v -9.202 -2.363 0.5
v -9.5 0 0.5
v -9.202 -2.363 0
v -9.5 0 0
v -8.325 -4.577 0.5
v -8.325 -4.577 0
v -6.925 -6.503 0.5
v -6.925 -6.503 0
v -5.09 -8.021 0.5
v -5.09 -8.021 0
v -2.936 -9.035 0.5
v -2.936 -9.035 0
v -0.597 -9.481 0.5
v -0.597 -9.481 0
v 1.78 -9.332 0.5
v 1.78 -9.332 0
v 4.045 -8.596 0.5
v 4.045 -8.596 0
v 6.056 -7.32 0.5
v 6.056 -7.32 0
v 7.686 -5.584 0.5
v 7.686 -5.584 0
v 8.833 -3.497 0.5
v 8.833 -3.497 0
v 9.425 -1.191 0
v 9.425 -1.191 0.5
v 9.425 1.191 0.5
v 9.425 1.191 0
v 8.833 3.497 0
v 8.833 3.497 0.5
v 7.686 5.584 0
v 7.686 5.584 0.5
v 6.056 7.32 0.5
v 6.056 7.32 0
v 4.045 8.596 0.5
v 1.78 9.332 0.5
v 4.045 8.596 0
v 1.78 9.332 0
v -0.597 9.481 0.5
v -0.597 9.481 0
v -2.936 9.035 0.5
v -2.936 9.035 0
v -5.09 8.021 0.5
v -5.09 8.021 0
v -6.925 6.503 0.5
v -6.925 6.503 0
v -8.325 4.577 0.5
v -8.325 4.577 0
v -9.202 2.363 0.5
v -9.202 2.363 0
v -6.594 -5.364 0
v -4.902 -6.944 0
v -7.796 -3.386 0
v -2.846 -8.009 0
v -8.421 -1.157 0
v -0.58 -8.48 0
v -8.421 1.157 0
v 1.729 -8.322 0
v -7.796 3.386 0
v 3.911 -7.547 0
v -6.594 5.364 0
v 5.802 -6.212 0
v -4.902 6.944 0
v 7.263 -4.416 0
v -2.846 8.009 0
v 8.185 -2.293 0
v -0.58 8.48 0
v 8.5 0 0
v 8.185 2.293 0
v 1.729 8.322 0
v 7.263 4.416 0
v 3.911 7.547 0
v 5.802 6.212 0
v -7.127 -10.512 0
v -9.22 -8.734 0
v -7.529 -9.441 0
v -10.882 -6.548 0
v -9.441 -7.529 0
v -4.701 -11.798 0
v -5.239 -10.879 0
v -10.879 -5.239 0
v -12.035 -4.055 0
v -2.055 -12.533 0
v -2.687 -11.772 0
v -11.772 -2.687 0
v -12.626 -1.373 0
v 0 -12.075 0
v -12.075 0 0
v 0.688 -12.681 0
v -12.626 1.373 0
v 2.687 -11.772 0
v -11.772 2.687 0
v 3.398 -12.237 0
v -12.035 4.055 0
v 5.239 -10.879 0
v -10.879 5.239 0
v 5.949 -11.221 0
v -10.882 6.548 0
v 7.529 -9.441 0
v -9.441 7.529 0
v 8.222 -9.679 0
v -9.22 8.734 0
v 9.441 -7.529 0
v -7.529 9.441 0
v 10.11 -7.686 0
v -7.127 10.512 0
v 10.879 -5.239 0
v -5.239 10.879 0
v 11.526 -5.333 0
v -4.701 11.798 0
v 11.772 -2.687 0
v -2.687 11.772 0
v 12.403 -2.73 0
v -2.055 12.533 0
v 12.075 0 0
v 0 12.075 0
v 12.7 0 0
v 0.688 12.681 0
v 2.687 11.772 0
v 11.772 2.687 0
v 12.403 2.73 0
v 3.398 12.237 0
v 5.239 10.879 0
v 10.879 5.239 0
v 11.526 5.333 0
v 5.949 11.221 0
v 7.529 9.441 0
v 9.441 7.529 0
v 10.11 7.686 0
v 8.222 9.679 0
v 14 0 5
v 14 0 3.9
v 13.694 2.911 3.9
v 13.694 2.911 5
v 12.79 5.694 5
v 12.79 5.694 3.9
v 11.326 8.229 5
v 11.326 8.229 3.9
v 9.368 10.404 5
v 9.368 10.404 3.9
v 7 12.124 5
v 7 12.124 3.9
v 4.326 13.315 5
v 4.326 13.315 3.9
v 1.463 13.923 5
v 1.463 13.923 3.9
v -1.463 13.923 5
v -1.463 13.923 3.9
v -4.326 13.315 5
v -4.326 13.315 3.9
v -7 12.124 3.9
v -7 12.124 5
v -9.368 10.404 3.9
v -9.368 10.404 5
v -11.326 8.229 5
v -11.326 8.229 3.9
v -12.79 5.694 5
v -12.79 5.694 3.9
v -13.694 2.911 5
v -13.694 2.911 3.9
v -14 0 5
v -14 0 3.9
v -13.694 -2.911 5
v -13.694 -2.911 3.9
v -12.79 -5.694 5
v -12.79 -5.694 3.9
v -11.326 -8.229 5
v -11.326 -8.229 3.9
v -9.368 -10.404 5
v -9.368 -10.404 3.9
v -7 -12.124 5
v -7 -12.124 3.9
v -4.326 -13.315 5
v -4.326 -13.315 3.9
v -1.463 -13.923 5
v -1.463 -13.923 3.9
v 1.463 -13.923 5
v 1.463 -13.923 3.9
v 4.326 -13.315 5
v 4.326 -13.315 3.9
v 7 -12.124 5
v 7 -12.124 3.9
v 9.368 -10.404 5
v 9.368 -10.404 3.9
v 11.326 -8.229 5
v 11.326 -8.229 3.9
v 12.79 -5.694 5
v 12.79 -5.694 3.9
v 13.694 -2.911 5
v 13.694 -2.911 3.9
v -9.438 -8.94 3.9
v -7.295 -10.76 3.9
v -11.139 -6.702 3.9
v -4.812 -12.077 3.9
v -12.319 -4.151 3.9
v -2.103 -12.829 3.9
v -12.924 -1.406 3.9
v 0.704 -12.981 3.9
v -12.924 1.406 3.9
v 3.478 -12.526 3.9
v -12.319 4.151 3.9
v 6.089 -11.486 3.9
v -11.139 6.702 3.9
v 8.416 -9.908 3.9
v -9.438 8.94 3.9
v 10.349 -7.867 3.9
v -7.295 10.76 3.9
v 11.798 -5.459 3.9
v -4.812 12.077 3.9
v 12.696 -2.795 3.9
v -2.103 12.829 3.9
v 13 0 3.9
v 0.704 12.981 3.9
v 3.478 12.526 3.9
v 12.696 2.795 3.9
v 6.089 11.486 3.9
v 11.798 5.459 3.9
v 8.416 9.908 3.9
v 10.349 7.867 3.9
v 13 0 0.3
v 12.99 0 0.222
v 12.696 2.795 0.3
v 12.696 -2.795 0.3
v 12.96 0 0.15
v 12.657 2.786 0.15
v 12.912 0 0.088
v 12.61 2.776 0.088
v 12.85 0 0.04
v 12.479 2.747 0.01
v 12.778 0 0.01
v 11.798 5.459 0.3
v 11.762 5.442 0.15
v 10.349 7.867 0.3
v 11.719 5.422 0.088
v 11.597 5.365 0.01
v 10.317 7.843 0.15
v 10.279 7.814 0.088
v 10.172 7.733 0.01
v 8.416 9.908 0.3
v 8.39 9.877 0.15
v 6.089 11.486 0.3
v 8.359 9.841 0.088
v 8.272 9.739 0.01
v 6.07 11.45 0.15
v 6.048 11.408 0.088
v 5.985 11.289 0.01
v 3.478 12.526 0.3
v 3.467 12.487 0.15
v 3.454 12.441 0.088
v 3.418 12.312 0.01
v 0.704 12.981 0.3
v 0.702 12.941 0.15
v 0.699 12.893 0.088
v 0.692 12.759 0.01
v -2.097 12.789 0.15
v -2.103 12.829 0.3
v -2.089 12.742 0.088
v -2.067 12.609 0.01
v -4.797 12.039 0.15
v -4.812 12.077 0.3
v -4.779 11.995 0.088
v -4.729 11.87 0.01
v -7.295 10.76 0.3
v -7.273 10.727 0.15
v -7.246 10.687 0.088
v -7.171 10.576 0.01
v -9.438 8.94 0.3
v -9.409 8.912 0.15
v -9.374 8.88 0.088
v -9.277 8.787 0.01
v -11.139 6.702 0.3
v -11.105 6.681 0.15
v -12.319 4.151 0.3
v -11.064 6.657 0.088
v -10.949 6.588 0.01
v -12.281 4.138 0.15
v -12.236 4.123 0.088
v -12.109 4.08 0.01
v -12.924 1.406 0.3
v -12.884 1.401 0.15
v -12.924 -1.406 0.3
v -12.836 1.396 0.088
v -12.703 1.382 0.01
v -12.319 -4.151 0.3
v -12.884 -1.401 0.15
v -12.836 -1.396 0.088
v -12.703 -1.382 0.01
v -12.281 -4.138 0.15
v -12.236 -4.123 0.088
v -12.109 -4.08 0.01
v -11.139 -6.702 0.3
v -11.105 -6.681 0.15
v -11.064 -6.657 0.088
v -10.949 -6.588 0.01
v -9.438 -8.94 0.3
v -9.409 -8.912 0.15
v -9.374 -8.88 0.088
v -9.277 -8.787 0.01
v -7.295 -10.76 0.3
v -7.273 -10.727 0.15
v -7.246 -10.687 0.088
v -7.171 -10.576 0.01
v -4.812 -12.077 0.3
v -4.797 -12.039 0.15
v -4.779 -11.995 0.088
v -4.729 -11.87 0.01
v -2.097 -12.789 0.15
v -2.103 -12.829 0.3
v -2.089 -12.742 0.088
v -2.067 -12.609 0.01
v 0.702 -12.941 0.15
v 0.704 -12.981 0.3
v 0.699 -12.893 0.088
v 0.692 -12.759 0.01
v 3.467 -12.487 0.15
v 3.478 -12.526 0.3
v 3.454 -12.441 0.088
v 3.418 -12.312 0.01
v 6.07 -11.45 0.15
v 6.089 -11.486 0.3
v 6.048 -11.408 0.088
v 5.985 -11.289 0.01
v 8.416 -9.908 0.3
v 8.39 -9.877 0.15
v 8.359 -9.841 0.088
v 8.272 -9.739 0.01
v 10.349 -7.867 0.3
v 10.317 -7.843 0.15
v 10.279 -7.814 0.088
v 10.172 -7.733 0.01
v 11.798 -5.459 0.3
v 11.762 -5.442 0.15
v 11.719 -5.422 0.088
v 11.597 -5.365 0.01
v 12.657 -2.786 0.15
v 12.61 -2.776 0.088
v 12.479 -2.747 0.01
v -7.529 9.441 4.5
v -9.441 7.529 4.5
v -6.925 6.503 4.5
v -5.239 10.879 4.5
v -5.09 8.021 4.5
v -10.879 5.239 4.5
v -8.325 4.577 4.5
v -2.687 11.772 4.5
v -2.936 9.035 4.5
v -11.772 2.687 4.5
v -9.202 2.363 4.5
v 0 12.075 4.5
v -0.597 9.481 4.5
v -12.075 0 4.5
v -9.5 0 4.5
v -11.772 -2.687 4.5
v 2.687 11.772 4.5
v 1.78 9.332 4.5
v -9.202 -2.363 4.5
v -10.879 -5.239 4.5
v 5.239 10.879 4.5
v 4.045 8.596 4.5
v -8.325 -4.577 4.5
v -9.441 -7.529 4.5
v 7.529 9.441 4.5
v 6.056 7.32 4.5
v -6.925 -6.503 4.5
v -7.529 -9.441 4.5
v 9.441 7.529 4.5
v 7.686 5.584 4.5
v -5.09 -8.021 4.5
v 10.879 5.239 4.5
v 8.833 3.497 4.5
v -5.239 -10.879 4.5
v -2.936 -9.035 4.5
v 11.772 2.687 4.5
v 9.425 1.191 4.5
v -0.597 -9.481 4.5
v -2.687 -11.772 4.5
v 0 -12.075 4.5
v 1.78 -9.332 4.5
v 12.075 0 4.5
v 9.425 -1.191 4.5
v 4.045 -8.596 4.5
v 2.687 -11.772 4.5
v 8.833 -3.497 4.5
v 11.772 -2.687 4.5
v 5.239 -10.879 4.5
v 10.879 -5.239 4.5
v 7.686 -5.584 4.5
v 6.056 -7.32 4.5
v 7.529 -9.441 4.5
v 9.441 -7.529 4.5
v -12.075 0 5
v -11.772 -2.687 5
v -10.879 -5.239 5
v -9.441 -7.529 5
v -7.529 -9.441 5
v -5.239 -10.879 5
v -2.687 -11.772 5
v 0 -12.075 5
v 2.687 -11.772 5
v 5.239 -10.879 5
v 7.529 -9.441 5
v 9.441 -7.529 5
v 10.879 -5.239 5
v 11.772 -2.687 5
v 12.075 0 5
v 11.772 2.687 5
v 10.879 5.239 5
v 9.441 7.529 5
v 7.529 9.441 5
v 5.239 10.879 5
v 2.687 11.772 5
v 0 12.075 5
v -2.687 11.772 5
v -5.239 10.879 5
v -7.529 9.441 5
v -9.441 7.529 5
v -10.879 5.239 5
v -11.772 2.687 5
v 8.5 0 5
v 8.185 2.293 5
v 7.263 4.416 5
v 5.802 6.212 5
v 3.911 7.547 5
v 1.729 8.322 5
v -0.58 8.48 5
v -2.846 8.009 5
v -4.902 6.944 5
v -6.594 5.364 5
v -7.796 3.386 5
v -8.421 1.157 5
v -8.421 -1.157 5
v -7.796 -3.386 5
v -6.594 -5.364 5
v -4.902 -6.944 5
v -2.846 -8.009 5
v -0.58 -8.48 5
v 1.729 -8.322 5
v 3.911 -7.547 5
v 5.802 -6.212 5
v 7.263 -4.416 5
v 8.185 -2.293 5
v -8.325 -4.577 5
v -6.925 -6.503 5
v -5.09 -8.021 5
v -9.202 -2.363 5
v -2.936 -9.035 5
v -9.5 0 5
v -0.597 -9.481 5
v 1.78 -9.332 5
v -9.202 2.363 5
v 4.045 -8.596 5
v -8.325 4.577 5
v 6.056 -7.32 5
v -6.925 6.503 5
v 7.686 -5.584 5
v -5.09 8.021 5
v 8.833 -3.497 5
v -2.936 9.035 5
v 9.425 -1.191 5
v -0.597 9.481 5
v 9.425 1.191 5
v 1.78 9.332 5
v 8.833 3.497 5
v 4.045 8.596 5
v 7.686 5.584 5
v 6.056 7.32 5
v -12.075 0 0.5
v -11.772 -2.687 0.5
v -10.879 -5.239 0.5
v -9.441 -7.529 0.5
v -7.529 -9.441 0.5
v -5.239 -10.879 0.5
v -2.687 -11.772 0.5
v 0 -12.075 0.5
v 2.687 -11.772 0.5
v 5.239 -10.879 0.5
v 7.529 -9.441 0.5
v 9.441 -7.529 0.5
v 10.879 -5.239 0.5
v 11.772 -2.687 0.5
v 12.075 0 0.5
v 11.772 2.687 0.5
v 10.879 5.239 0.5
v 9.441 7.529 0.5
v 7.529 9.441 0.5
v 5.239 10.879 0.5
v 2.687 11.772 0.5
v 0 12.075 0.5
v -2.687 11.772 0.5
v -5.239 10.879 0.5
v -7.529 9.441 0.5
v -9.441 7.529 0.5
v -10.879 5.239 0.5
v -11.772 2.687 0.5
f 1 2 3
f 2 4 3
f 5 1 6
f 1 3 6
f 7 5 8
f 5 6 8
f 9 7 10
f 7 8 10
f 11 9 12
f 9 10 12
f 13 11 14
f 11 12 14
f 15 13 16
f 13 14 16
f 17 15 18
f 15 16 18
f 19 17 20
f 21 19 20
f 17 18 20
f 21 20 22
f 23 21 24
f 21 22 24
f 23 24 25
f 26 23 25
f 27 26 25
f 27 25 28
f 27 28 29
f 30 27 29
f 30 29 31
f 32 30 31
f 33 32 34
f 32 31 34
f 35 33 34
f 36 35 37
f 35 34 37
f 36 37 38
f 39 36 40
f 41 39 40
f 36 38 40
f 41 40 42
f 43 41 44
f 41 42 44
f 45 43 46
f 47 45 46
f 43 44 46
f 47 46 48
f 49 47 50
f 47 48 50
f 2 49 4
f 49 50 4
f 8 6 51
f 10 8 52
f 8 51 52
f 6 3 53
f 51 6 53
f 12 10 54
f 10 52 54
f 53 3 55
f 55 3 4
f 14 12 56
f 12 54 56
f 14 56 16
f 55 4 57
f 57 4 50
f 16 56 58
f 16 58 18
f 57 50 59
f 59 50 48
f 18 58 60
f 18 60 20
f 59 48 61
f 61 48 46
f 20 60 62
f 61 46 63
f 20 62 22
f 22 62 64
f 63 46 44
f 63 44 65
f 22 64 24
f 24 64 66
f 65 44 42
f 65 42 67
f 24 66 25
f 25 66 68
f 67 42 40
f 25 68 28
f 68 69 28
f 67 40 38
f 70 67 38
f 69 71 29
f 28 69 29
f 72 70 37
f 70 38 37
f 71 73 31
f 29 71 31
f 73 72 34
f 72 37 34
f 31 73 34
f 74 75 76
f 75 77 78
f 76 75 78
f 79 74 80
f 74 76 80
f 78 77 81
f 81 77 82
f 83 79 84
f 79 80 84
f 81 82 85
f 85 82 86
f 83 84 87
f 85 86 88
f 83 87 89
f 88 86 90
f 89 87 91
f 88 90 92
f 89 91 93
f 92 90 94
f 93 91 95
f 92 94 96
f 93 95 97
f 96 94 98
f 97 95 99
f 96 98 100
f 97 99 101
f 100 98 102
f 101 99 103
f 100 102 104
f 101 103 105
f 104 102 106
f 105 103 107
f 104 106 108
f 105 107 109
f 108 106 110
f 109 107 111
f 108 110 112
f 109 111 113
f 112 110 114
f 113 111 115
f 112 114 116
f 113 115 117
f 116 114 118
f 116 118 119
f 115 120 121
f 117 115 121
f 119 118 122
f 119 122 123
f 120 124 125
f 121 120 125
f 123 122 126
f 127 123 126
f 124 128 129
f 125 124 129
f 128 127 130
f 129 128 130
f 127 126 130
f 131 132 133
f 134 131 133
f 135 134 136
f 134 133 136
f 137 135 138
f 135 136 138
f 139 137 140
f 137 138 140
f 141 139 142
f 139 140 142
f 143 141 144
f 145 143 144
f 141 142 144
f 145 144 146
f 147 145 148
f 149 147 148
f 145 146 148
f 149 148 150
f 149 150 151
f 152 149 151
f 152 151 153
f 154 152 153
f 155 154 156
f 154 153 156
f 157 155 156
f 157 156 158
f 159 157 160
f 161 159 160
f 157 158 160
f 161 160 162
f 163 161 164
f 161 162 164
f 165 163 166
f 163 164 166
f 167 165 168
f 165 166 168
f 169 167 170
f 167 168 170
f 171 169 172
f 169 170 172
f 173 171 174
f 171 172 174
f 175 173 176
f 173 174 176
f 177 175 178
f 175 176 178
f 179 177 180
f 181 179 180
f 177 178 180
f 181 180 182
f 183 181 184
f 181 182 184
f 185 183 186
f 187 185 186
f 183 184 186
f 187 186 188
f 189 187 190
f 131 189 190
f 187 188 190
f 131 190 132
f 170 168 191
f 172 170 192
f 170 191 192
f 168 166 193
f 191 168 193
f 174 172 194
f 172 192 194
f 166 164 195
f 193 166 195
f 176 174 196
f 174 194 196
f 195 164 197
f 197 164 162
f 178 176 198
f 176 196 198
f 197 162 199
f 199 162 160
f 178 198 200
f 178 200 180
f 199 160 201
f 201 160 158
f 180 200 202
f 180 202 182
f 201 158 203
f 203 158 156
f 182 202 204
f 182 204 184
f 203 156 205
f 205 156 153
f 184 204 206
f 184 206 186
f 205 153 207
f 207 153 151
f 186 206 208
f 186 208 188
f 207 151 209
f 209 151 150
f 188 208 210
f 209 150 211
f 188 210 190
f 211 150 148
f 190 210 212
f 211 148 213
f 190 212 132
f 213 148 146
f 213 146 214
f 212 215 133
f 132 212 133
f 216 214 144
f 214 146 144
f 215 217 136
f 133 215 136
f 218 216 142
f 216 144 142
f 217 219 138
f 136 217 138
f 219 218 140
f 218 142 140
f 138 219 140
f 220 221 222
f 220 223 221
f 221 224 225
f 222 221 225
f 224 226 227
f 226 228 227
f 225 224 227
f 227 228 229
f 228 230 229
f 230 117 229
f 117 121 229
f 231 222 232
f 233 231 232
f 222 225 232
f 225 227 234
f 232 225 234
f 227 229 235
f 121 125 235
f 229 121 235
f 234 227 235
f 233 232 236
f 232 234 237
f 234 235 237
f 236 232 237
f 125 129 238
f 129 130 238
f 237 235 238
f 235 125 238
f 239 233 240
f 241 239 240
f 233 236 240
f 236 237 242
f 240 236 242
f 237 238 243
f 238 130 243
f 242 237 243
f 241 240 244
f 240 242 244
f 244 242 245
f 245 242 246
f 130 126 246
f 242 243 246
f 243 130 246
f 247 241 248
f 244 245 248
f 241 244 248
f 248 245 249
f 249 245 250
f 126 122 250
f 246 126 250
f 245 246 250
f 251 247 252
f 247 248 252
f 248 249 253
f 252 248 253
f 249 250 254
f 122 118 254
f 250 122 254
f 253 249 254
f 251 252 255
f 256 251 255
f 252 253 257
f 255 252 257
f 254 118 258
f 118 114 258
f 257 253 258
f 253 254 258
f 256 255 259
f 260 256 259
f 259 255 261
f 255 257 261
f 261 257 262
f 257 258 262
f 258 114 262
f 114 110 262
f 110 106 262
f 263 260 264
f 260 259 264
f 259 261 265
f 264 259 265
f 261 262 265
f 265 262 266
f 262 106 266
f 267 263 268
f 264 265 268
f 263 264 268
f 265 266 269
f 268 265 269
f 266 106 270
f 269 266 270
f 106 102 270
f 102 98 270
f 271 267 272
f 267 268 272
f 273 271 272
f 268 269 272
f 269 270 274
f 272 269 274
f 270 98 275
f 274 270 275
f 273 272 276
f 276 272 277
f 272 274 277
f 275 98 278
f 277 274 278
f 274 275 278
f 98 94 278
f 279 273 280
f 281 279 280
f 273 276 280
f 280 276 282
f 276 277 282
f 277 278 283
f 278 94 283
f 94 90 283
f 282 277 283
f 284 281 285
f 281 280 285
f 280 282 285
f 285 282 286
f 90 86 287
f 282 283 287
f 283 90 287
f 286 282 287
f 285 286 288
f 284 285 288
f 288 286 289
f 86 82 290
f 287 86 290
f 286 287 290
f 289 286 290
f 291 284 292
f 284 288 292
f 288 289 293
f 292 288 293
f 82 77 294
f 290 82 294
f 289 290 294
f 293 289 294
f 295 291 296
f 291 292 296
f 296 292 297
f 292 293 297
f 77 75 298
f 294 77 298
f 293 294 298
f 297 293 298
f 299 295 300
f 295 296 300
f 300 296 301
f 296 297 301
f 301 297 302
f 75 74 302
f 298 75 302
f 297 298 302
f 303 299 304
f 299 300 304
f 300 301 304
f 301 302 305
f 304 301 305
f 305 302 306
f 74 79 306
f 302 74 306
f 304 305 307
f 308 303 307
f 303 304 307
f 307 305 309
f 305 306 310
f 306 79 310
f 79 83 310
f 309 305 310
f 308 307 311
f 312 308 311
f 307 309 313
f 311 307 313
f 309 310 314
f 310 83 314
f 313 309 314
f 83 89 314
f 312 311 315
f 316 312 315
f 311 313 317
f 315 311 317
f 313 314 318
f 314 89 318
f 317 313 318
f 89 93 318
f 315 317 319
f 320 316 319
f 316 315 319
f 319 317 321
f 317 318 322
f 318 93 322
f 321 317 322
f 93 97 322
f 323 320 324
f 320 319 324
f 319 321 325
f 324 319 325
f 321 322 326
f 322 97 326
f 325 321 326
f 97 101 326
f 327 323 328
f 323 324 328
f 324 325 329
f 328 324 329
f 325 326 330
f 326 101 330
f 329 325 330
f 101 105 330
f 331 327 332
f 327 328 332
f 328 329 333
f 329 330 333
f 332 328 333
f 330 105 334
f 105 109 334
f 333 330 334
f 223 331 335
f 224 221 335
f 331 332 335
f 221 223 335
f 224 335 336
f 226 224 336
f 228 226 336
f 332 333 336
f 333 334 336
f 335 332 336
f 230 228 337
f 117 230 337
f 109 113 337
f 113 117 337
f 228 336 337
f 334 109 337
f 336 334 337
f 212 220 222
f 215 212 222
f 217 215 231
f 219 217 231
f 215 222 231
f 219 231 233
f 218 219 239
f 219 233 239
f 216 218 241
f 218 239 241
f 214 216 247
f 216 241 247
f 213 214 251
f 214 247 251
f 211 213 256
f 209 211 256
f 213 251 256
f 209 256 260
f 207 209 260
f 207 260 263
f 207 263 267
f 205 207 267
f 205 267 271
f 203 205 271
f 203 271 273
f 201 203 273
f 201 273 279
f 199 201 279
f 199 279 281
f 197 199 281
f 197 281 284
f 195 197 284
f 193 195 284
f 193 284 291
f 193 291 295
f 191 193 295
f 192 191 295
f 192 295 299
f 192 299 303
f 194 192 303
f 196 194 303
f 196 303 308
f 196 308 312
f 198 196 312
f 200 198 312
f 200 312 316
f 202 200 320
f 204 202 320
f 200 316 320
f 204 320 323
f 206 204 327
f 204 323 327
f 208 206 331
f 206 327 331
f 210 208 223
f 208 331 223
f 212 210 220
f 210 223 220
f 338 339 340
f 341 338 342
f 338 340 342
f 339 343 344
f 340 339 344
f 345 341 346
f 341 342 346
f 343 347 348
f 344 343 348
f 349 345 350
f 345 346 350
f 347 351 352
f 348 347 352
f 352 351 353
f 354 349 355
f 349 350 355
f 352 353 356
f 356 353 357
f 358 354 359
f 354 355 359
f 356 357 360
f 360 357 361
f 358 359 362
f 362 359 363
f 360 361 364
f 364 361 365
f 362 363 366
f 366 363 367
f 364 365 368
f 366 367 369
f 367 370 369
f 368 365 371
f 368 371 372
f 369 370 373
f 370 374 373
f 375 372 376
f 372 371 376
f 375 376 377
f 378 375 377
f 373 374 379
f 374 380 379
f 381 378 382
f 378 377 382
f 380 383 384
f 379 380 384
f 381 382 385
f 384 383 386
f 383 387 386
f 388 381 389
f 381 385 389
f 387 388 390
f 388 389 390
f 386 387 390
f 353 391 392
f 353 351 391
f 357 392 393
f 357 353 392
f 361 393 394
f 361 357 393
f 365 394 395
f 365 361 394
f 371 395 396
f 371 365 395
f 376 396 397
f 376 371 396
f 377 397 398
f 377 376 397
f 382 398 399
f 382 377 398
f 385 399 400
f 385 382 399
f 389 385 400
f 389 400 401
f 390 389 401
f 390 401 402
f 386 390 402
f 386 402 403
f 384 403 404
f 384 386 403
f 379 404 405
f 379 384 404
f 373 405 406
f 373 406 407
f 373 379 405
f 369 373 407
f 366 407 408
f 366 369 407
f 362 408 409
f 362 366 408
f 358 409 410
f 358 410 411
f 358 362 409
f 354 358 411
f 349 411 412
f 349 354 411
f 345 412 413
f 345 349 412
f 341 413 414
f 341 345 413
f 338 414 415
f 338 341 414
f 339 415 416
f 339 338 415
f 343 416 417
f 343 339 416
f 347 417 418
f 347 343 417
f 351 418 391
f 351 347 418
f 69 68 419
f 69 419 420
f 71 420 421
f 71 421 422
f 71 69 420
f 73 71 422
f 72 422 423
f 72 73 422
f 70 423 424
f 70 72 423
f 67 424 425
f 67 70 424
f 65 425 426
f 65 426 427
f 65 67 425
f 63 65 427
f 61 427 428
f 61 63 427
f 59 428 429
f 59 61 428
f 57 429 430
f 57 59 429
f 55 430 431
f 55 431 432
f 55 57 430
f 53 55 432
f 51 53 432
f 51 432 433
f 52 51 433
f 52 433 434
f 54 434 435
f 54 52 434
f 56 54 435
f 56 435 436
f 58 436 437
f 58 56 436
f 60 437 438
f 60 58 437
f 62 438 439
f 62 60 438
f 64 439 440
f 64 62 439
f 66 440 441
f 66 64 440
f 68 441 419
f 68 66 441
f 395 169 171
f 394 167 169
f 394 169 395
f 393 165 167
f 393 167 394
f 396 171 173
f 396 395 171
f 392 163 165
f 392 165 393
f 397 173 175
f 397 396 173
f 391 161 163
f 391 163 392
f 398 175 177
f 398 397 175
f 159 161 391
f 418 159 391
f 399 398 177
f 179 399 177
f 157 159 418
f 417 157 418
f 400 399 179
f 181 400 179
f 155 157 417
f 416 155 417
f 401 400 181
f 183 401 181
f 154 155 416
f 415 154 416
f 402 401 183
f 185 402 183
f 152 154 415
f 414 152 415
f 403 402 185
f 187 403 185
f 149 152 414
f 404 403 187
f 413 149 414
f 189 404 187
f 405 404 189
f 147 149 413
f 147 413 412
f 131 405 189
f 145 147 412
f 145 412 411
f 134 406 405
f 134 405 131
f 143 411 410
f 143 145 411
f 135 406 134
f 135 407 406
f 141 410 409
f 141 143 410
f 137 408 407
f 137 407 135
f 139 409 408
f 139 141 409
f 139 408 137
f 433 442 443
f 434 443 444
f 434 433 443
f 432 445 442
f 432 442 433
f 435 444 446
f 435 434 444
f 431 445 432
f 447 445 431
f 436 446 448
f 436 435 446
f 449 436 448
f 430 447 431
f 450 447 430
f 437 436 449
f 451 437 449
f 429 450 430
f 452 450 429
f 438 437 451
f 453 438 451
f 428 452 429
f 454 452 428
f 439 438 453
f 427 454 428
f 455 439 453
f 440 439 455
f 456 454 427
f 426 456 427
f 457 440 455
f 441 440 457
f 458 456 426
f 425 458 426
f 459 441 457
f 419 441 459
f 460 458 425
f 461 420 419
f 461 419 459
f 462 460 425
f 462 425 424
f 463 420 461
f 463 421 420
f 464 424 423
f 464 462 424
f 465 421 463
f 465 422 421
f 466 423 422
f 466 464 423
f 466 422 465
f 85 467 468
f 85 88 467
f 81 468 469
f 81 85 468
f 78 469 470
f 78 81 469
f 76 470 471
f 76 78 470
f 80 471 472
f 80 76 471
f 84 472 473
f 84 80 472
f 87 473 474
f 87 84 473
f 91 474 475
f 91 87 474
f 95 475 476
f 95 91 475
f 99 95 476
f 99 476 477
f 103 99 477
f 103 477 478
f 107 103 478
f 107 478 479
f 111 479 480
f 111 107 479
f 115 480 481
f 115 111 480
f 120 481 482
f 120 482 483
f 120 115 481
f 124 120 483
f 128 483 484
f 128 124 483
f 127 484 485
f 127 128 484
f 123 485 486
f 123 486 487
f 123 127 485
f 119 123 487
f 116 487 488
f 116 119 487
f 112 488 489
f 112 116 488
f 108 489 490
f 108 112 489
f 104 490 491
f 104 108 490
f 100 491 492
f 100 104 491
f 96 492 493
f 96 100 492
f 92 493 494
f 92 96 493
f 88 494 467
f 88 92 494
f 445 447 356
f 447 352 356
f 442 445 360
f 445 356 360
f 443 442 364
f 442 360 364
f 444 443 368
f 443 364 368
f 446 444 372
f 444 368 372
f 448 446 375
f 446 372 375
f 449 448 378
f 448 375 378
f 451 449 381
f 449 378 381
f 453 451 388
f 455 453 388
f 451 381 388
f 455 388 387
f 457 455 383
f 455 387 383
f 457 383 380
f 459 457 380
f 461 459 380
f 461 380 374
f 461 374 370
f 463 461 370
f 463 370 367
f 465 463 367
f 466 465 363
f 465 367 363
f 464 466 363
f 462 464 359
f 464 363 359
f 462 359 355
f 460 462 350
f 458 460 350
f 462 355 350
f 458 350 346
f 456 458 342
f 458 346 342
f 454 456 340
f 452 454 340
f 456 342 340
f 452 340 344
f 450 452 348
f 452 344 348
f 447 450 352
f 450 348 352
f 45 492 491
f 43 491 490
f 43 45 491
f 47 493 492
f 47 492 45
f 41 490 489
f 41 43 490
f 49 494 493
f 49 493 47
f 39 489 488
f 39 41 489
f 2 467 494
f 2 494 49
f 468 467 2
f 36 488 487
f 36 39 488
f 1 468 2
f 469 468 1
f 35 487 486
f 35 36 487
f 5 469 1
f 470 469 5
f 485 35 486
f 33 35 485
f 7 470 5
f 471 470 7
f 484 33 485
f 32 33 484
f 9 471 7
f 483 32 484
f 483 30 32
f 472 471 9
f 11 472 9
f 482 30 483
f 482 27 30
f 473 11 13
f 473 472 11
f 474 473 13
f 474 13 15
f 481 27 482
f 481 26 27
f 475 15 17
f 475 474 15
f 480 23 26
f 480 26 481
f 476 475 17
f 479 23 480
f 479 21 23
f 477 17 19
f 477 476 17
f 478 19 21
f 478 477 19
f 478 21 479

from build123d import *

# Parameters (mm, degrees)
SKETCH_1_R      = 13
SKETCH_1_R_2    = 8.5
EXTRUDE_1_DEPTH = 5
EXTRUDE_START   = -1.1
SKETCH_2_R      = 14
SKETCH_2_R_2    = 13
EXTRUDE_2_DEPTH = 1.1
FILLET_1_R      = 0.3
SKETCH_3_W      = 0.5
SKETCH_3_H      = 2.575


with BuildPart() as part:
    # 草图1 → 凸台-拉伸1 (new body)
    with BuildSketch(Plane.XY):
        Circle(SKETCH_1_R)
        Circle(SKETCH_1_R_2, mode=Mode.SUBTRACT)
    extrude(amount=EXTRUDE_1_DEPTH)

    # 草图2 → 凸台-拉伸2 (add)
    with BuildSketch(Plane.XY.offset(5).offset(EXTRUDE_START)):
        Circle(SKETCH_2_R)
        Circle(SKETCH_2_R_2, mode=Mode.SUBTRACT)
    extrude(amount=EXTRUDE_2_DEPTH)

    # 圆角1
    fillet_1_edges = [part.edges().sort_by_distance(p)[0] for p in [
        (-13, 0, 0),
    ]]
    fillet(fillet_1_edges, radius=FILLET_1_R)

    # 草图3 → 切除-旋转1 (revolve, cut)
    with BuildSketch(Plane(origin=(0, 0, 0), x_dir=(0, 0, -1), z_dir=(1, 0, 0)), mode=Mode.PRIVATE) as cut_revolve_1_sk:
        with Locations((-0.25, 10.7875)):
            Rectangle(SKETCH_3_W, SKETCH_3_H)
        with Locations((-4.75, 10.7875)):
            Rectangle(SKETCH_3_W, SKETCH_3_H)
    revolve(cut_revolve_1_sk.sketch.rotate(Axis((0, 0, 0), (0, 0, 1)), 90), axis=Axis((0, 0, 0), (0, 0, 1)), mode=Mode.SUBTRACT)


solid = part.part
